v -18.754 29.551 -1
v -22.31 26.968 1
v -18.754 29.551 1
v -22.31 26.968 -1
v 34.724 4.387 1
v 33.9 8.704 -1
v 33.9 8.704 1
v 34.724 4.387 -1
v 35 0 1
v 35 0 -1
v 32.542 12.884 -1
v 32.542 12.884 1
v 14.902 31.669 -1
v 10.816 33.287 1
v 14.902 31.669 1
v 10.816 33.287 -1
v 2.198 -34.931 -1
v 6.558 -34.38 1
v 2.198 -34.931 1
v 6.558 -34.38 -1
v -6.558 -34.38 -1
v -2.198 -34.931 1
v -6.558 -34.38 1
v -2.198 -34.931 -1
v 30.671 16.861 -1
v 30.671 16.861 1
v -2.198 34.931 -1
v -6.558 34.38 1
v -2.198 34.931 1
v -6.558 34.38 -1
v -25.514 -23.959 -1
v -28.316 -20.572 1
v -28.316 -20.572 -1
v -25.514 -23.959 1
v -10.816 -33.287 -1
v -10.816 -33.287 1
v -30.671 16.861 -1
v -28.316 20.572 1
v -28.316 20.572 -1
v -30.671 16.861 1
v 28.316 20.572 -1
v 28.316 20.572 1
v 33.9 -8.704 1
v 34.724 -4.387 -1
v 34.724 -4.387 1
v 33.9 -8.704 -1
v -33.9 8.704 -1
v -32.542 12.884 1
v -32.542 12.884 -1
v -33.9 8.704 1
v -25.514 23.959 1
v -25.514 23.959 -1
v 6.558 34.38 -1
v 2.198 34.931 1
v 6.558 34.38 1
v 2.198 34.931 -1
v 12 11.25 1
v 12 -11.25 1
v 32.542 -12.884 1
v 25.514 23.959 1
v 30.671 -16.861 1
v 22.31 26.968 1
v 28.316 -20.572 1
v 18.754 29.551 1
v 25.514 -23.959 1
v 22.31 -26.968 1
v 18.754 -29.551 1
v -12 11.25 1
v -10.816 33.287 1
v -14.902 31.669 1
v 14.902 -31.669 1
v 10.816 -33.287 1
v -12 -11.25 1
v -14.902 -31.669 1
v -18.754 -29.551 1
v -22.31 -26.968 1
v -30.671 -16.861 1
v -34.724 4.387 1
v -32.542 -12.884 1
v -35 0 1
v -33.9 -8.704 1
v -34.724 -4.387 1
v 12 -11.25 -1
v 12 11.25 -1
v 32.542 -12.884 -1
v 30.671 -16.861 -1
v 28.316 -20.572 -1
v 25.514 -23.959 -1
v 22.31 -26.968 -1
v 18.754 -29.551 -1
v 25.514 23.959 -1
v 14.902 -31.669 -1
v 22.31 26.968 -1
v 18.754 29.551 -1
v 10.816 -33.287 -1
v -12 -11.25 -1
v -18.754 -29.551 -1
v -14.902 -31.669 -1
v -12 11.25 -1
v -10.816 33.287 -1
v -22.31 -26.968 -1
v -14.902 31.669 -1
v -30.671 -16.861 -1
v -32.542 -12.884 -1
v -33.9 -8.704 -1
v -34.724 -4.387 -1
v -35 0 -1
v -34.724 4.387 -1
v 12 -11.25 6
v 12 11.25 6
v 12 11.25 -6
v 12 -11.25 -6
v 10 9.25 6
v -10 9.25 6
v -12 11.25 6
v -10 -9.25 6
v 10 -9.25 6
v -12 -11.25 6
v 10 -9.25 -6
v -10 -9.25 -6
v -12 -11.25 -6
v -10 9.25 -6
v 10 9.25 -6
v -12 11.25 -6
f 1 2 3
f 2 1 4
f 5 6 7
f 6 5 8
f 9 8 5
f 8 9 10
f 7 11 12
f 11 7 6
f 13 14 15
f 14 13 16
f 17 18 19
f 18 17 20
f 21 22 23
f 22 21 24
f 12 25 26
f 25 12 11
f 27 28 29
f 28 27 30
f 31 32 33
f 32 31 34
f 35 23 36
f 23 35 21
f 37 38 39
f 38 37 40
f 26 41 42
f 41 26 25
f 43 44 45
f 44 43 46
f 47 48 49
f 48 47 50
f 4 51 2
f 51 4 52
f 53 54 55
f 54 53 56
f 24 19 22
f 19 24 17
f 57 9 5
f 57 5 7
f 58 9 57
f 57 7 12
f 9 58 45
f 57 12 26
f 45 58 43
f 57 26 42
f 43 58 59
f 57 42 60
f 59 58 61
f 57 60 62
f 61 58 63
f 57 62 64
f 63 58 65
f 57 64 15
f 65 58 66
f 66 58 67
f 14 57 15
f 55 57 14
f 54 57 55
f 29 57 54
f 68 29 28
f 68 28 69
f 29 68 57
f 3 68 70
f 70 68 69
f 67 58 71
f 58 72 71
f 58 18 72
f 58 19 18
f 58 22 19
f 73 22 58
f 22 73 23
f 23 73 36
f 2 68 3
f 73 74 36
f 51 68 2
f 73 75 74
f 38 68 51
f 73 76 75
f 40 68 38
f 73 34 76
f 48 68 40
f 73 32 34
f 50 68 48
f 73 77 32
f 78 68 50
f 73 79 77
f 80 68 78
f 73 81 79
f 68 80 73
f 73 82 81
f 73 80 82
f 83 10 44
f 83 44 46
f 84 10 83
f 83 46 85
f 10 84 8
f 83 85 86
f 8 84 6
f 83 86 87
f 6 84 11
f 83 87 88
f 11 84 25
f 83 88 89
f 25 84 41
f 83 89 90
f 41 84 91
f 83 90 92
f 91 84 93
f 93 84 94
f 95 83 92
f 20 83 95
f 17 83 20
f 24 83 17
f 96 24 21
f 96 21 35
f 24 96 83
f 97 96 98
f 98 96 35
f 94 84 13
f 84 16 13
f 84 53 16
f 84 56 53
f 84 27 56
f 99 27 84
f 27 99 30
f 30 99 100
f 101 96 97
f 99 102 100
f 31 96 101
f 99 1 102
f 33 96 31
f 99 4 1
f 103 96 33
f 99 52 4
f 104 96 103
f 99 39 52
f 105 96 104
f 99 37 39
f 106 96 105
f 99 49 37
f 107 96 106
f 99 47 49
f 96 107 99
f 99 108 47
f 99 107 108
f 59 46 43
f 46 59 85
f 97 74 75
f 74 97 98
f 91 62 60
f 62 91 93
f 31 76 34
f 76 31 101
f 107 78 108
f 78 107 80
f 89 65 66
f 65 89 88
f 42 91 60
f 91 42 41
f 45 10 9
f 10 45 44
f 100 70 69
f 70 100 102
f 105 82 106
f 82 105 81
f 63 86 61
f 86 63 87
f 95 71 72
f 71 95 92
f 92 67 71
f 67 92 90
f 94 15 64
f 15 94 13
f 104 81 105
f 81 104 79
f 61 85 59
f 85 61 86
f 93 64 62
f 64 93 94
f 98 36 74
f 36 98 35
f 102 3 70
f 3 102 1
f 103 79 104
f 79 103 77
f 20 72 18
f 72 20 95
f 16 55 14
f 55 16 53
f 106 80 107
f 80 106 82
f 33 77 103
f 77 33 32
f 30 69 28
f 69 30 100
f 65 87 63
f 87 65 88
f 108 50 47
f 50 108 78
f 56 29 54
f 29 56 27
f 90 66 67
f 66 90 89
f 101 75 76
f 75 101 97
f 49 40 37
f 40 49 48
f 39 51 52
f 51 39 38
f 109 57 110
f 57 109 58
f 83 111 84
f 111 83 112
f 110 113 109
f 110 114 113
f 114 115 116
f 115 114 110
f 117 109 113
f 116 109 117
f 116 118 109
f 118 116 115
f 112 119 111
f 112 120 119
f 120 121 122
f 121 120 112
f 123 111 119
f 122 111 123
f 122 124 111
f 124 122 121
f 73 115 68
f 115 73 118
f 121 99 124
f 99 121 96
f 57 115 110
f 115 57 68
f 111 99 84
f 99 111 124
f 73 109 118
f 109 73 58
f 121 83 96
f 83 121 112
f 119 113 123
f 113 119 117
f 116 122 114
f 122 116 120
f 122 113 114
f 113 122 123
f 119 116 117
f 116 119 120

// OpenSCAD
$fn = 50;

wall = 2;
out_d = 70;
hole_dist = 75;
hole_d = 3.8;

difference() {
	union() {
		cylinder(d=out_d, h=wall, center=true);
		cube([20+2*wall, 18.5+2*wall, 12], center=true);
	}
	cube([20, 18.5, 50], center=true);
	for(hole_pos=[[1,-1], [1,1], [-1,1], [-1,-1]]) {
		translate([hole_pos[0]*hole_dist/2, hole_pos[1]*hole_dist/2, 0]) {
			cylinder(d=hole_d, h=wall, center=true);
		}
	}
}
